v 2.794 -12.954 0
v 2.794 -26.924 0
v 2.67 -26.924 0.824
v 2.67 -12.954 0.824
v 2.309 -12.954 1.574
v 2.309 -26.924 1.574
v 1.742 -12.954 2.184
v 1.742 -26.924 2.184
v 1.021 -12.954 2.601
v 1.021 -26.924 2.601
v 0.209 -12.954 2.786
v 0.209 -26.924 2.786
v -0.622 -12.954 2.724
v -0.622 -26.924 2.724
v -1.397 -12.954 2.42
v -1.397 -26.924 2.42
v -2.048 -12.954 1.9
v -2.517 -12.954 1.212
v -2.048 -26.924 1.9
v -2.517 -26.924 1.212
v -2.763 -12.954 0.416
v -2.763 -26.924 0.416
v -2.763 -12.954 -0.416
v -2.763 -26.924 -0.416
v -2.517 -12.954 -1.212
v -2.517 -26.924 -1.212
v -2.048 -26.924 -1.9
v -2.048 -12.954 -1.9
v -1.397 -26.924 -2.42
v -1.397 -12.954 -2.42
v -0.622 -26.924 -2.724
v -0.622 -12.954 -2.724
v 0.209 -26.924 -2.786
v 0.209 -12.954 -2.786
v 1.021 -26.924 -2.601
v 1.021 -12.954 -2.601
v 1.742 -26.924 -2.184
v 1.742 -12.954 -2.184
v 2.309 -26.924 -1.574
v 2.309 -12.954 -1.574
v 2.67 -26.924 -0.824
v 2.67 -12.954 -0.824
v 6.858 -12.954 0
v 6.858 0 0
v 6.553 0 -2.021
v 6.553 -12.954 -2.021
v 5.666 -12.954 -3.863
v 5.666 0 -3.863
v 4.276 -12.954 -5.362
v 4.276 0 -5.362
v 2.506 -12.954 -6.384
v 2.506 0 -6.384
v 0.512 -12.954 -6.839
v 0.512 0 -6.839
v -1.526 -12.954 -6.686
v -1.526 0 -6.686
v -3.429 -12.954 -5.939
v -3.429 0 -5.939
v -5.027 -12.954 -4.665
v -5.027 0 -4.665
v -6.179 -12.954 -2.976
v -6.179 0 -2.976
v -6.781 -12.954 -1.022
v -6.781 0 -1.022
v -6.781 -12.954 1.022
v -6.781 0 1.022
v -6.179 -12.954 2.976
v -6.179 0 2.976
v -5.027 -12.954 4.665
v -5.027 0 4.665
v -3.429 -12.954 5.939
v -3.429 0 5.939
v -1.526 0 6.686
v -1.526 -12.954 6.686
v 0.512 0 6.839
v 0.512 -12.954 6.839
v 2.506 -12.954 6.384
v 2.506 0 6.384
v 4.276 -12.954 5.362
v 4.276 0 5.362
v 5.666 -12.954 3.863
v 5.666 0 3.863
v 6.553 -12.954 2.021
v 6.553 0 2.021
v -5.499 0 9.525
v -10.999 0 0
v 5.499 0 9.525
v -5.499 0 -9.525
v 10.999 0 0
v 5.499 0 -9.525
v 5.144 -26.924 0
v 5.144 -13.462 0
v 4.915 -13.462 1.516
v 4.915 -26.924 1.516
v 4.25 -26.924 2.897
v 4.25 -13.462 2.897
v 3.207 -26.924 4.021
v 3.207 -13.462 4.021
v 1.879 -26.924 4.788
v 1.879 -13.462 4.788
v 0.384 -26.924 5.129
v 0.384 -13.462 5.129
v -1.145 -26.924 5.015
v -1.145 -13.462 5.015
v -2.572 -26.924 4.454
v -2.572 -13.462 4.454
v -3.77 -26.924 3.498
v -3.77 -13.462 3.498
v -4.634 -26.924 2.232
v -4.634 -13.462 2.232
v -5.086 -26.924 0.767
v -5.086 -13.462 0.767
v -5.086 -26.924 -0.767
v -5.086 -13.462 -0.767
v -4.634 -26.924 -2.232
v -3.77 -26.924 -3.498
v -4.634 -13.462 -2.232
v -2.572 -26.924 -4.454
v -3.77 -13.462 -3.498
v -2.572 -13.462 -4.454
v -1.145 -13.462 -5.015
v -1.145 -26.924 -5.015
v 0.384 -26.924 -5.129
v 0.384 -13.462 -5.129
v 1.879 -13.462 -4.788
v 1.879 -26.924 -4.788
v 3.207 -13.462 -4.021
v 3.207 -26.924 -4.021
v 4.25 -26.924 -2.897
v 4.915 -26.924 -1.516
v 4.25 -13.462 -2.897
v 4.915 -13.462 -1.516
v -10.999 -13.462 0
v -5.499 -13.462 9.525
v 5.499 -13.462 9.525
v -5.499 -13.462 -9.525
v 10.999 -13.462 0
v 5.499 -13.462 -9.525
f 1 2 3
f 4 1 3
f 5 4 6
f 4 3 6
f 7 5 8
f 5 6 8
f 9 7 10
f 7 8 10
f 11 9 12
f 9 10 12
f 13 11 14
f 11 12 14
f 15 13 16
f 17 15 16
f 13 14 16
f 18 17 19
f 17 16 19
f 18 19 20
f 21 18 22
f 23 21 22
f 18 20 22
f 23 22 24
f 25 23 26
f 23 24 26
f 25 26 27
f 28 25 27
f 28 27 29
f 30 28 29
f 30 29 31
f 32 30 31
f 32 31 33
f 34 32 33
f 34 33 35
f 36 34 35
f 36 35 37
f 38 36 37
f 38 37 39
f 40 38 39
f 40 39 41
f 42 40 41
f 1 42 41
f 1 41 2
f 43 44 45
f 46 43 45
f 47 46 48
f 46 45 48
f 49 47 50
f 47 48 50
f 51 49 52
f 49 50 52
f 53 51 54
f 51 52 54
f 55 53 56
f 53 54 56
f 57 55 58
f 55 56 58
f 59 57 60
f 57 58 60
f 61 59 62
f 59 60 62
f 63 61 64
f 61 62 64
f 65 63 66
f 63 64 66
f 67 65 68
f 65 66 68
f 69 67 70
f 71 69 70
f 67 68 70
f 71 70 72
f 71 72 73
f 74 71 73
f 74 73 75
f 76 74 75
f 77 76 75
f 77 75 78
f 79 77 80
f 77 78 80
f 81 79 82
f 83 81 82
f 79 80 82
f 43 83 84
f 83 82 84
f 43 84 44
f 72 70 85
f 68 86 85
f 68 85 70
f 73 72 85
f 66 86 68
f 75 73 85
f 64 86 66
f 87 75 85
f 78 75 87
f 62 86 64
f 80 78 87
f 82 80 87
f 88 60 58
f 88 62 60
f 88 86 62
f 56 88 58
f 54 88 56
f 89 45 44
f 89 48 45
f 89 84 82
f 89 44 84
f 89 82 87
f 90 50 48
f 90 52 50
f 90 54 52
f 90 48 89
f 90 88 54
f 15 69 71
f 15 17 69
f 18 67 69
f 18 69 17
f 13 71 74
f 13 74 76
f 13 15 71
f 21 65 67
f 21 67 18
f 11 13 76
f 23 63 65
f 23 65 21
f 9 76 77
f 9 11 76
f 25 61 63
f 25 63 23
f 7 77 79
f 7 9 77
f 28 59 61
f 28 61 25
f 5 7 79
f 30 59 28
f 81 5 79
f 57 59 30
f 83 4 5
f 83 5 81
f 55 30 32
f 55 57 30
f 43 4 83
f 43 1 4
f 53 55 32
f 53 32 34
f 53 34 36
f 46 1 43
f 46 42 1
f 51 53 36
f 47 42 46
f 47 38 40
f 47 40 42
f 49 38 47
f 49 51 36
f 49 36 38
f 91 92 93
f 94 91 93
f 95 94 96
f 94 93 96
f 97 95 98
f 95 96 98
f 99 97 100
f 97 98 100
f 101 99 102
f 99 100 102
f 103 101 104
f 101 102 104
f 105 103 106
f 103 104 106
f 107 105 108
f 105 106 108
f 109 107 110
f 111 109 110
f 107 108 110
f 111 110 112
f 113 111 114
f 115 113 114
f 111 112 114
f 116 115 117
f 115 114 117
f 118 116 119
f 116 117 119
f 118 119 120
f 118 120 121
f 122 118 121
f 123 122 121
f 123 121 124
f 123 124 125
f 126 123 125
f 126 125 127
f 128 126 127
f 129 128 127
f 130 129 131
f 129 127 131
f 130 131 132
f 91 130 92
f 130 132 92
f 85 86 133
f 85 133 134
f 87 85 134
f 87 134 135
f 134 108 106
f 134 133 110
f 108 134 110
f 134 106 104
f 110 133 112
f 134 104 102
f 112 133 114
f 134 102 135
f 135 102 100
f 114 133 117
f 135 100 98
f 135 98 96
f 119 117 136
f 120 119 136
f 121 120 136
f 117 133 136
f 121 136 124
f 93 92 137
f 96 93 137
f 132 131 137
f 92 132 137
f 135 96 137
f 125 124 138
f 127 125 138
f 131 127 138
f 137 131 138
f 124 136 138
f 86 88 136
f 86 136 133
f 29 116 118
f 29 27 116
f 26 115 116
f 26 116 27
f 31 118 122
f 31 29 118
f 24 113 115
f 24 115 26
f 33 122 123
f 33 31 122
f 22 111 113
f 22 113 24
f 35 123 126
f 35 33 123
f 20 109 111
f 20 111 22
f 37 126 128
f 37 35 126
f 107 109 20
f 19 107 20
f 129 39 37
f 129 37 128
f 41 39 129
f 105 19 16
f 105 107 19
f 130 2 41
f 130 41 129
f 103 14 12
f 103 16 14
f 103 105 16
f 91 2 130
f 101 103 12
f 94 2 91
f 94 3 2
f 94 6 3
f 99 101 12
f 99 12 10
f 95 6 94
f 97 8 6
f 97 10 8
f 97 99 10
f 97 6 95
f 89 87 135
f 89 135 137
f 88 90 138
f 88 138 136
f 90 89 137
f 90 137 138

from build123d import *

# Parameters (mm, degrees)
BOSS_EXTRUDE1_DEPTH = 13.462
SKETCH2_R           = 6.858
CUT_EXTRUDE1_DEPTH  = 12.954
SKETCH3_R           = 5.1435
BOSS_EXTRUDE2_DEPTH = 13.462
SKETCH4_R           = 2.794
CUT_EXTRUDE2_DEPTH  = 27.924


with BuildPart() as part:
    # Sketch1 → Boss-Extrude1 (new body)
    with BuildSketch(Plane(origin=(0, 0, 0), x_dir=(1, 0, 0), z_dir=(0, 1, 0))):
        Polygon((5.499261314, 9.525), (-5.499261314, 9.525), (-10.998522628, 0), (-5.499261314, -9.525), (5.499261314, -9.525), (10.998522628, 0), align=None)
    extrude(amount=-BOSS_EXTRUDE1_DEPTH)

    # Sketch2 → Cut-Extrude1 (cut)
    with BuildSketch(Plane(origin=(0, 0, 0), x_dir=(1, 0, 0), z_dir=(0, 1, 0))):
        Circle(SKETCH2_R)
    extrude(amount=-CUT_EXTRUDE1_DEPTH, mode=Mode.SUBTRACT)

    # Sketch3 → Boss-Extrude2 (add)
    with BuildSketch(Plane.XZ.offset(13.462)):
        Circle(SKETCH3_R)
    extrude(amount=BOSS_EXTRUDE2_DEPTH)

    # Sketch4 → Cut-Extrude2 (cut, through all)
    with BuildSketch(Plane.XZ.offset(26.924)):
        Circle(SKETCH4_R)
    extrude(amount=-CUT_EXTRUDE2_DEPTH, mode=Mode.SUBTRACT)


solid = part.part
